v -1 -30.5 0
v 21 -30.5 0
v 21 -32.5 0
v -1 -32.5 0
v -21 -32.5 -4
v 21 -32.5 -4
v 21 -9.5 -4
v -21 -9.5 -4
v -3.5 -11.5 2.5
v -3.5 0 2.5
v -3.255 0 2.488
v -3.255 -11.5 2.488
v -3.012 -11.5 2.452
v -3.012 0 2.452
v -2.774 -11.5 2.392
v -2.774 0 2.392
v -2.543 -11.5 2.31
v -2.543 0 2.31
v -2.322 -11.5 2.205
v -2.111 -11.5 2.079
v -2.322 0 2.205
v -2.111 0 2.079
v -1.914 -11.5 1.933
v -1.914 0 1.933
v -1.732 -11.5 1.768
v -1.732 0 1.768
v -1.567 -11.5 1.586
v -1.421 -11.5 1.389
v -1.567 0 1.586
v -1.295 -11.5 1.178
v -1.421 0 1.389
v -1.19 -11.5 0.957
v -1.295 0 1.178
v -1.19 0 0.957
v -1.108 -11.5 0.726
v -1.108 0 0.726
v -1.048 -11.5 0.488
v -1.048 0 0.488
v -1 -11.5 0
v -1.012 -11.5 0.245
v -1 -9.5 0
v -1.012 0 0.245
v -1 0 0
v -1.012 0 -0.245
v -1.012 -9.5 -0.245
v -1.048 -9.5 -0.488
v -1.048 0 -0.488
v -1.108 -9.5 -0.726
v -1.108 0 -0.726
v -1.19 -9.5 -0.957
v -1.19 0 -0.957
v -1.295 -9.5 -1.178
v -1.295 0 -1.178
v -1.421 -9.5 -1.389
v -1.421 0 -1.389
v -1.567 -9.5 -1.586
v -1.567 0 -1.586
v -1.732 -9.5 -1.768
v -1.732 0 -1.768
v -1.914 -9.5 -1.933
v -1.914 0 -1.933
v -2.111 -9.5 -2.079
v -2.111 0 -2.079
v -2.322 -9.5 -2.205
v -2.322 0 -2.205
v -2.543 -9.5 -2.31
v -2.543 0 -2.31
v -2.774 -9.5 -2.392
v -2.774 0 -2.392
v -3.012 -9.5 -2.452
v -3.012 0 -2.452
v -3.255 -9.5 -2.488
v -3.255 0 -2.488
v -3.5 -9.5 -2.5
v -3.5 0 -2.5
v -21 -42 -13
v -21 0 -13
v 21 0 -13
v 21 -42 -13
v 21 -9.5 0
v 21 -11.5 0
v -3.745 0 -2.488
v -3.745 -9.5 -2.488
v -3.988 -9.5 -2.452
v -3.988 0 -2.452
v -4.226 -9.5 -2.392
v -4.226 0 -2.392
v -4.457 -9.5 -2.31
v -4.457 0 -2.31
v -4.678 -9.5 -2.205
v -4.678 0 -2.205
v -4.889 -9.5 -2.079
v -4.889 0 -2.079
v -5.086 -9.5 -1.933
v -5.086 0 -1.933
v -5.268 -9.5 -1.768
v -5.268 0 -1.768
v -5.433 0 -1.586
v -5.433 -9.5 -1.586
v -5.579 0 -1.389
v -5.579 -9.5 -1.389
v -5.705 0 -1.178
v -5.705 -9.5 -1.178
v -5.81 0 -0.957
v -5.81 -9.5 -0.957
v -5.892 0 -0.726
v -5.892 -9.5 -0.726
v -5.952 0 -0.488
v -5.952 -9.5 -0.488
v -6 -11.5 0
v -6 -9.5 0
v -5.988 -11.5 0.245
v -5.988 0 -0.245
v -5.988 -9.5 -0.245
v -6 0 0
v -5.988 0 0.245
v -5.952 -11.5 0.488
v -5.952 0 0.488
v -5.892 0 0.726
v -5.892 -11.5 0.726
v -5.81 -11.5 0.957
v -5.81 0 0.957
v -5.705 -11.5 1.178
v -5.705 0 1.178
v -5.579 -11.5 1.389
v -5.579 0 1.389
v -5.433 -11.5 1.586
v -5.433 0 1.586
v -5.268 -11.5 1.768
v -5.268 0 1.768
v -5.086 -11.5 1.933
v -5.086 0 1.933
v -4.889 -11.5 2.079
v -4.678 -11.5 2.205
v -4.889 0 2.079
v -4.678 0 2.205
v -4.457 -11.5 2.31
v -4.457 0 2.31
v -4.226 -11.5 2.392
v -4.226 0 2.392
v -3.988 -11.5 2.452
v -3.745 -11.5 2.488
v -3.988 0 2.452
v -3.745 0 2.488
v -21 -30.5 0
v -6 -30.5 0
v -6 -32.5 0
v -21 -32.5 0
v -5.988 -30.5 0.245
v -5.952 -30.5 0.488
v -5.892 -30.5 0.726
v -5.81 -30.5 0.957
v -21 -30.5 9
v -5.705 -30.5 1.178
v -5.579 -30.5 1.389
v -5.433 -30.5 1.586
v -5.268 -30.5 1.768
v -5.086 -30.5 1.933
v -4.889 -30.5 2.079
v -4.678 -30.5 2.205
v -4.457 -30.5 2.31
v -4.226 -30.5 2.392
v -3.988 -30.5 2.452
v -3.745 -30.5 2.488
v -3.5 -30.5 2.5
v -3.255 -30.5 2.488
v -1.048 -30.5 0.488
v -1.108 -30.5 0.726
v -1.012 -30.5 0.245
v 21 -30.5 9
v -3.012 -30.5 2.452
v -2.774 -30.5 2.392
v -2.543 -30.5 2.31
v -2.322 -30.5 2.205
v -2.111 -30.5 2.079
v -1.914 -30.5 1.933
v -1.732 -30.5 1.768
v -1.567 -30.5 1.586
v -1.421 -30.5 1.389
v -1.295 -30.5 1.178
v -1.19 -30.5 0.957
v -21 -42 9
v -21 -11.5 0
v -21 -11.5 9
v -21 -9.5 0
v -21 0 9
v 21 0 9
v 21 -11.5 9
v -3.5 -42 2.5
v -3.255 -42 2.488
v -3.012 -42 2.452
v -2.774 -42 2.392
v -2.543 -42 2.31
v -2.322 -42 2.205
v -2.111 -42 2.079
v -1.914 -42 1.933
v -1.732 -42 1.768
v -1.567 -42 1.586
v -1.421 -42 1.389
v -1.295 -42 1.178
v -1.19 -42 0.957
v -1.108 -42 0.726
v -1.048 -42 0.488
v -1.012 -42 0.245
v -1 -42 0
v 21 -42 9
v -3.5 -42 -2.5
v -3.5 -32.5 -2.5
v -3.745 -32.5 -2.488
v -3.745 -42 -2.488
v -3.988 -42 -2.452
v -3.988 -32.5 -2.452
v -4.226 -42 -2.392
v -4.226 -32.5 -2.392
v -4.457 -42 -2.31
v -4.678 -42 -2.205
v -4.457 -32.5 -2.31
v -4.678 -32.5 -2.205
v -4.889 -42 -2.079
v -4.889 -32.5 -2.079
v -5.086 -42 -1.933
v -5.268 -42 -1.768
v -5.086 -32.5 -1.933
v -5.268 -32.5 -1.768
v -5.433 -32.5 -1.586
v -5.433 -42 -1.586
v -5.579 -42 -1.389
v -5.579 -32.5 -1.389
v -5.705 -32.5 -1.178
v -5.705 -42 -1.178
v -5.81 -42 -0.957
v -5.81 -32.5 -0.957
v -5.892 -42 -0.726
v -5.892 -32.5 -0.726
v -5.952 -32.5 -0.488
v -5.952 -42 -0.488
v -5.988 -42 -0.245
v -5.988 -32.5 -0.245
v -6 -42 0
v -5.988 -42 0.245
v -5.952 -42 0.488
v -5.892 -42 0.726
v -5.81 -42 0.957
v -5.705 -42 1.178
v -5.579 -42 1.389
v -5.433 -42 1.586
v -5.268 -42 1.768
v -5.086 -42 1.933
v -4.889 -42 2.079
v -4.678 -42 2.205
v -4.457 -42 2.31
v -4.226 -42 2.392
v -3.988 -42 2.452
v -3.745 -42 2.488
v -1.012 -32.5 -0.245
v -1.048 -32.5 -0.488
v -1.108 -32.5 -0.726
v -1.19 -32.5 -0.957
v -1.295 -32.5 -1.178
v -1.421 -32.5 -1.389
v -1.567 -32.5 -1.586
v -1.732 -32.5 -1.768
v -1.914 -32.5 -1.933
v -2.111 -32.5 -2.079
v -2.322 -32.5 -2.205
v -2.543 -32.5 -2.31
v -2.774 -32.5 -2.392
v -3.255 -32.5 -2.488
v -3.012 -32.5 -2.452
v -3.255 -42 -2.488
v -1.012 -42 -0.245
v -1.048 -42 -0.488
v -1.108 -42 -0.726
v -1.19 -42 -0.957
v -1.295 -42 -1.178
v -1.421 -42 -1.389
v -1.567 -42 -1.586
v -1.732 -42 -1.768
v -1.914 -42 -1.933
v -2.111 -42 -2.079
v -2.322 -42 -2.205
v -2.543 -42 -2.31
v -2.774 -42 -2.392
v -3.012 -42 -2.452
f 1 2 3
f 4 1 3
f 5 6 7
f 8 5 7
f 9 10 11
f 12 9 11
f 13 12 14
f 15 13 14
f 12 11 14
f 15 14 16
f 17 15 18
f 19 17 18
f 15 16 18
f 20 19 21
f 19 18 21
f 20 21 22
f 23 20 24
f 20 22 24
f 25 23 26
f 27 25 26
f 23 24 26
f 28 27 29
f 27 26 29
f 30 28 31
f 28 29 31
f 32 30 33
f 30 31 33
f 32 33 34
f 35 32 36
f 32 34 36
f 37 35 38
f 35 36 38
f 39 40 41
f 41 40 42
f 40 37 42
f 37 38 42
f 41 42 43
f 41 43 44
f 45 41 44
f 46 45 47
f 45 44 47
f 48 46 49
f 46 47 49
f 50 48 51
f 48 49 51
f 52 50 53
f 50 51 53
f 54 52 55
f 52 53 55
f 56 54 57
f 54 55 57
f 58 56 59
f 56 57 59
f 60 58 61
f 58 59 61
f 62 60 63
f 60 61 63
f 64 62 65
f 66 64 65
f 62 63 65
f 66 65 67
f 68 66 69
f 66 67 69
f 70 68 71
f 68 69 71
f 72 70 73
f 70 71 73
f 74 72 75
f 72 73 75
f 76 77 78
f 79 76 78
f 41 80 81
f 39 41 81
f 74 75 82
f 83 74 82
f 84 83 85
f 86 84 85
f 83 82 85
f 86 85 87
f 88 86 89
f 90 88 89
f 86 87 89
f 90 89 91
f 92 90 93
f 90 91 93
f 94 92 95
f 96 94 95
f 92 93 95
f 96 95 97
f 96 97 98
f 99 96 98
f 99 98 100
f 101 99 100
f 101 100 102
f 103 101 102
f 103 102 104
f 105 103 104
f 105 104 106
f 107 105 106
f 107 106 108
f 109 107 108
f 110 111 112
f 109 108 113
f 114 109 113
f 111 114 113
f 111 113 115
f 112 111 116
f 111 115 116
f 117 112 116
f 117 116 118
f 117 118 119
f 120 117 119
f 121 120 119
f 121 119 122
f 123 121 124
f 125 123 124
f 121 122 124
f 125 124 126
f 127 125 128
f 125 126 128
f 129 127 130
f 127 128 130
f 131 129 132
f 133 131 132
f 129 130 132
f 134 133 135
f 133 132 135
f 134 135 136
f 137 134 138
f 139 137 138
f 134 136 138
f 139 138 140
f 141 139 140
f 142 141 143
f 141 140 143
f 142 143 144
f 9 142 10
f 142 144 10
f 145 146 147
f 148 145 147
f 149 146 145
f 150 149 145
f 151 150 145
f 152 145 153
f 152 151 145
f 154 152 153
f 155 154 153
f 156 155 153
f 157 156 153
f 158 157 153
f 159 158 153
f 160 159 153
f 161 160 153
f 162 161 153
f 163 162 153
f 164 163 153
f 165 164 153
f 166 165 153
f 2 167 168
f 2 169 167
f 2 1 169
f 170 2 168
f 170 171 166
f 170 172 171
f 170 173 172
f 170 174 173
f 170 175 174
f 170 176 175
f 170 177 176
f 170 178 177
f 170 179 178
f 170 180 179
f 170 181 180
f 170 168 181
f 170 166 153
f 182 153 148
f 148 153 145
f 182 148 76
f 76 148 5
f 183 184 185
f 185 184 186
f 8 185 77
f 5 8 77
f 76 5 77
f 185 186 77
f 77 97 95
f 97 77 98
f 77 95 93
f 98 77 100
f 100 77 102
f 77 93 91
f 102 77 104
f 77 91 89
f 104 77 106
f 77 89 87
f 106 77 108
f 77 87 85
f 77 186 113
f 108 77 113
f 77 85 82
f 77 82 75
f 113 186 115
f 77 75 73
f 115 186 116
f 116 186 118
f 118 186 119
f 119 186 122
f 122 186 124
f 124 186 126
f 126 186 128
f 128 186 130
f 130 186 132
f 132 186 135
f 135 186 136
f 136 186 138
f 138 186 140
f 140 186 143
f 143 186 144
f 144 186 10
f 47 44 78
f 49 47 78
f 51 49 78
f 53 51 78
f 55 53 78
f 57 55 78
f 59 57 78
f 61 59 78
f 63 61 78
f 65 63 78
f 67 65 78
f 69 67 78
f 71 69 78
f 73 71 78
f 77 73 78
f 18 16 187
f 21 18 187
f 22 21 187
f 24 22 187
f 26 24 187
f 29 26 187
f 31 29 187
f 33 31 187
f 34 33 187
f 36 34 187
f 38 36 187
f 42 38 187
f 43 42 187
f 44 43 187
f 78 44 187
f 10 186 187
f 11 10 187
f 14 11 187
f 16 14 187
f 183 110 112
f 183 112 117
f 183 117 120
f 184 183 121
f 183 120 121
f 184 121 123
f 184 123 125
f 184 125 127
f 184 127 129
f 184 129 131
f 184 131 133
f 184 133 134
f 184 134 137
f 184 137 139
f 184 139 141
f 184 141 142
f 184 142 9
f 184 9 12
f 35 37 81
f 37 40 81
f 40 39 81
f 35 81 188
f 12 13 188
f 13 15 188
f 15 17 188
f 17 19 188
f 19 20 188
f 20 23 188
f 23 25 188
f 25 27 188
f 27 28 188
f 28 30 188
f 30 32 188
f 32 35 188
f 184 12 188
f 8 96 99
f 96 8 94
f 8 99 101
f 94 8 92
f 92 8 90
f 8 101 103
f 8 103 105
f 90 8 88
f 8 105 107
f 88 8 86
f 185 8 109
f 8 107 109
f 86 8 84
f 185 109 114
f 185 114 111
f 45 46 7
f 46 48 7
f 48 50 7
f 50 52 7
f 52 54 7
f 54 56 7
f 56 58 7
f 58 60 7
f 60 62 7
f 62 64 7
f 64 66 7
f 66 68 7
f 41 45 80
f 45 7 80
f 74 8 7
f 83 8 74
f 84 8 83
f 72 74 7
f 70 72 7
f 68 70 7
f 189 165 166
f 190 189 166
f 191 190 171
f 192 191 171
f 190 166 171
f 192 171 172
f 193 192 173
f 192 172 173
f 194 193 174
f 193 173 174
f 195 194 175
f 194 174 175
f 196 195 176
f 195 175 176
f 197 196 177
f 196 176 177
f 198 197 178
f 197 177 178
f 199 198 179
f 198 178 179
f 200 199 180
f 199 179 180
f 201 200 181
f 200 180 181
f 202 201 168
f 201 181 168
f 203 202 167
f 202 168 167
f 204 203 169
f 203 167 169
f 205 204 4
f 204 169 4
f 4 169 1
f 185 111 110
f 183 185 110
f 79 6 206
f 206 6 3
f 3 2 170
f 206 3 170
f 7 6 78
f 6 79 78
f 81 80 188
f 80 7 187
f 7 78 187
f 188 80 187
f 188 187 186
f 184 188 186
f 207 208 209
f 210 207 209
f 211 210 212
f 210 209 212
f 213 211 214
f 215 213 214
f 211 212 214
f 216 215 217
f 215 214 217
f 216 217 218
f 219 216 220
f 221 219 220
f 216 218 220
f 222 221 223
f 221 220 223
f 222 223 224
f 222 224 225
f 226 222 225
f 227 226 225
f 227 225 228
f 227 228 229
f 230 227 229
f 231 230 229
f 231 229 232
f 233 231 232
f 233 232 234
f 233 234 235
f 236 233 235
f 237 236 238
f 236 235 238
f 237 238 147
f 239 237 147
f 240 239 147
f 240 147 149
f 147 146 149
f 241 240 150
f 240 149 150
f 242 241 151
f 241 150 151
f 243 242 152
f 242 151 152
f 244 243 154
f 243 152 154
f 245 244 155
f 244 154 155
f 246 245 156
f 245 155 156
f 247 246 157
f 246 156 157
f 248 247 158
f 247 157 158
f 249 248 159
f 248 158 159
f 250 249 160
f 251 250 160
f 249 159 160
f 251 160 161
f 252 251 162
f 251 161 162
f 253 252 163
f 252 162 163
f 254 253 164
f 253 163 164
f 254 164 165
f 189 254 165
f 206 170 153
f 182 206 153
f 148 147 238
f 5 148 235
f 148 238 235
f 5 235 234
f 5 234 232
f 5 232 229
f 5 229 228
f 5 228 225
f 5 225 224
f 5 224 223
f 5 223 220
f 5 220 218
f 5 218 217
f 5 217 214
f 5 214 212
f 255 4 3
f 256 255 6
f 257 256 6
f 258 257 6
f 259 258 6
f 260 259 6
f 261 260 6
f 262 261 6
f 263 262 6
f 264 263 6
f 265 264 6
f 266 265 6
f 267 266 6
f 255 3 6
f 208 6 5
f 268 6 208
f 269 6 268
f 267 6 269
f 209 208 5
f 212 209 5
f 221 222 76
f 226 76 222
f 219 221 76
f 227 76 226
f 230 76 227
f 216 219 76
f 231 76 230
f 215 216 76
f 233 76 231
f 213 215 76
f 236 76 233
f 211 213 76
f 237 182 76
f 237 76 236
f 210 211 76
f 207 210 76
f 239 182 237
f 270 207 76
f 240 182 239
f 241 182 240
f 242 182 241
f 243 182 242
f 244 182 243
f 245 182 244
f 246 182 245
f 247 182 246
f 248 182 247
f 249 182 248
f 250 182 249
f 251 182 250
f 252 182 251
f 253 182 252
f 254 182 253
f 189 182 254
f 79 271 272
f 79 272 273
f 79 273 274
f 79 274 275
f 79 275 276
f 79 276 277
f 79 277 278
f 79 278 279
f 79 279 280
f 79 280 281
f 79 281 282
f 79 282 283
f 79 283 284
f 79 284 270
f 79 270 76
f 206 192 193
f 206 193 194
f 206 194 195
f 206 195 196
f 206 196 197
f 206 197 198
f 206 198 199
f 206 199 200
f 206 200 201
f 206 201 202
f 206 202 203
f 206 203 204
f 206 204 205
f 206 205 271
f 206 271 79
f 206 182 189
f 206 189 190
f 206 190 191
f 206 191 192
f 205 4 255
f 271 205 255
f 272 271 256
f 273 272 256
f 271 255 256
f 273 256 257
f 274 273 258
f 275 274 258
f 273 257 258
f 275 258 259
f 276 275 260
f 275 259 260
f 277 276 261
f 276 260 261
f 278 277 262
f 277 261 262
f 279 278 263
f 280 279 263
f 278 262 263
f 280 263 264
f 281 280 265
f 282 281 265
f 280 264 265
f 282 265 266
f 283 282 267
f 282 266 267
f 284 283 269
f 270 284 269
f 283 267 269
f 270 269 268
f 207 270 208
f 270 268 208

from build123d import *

# Parameters (mm, degrees)
F1_DEPTH = 42
F2_W     = 9.5
F2_H     = 9
F3_DEPTH = 42


with BuildPart() as f1:
    # F0 (on Front) → F1 (new body)
    with BuildSketch(Plane.XZ):
        with BuildLine():
            Line((-21, -13), (-3.5, -13))
            Line((-3.5, -13), (-3.5, -2.5))
            ThreePointArc((-3.5, -2.5), (-6, 0), (-3.5, 2.5))
            Line((-3.5, 2.5), (-3.5, 9))
            Line((-3.5, 9), (-21, 9))
            Line((-21, 9), (-21, -13))
        make_face()
        with BuildLine():
            Line((-3.5, -13), (21, -13))
            Line((21, -13), (21, 9))
            Line((21, 9), (-3.5, 9))
            Line((-3.5, 9), (-3.5, 2.5))
            ThreePointArc((-3.5, 2.5), (-1.732233, 1.767767), (-1, 0))
            ThreePointArc((-1, 0), (-1.732233, -1.767767), (-3.5, -2.5))
            Line((-3.5, -2.5), (-3.5, -13))
        make_face()
    extrude(amount=F1_DEPTH)

    # F2 (on face) → F3 (cut)
    with BuildSketch(Plane.YZ.offset(21)):
        with Locations((-25.75, 4.5)):
            Rectangle(F2_W, F2_H)
        with Locations((-16.25, 4.5)):
            Rectangle(F2_W, F2_H)
        Polygon((-32.5, -4), (-21, -4), (-21, 0), (-30.5, 0), (-32.5, 0), align=None)
        Polygon((-21, 0), (-21, -4), (-9.5, -4), (-9.5, 0), (-11.5, 0), align=None)
    extrude(amount=-F3_DEPTH, mode=Mode.SUBTRACT)


solid = f1.part
